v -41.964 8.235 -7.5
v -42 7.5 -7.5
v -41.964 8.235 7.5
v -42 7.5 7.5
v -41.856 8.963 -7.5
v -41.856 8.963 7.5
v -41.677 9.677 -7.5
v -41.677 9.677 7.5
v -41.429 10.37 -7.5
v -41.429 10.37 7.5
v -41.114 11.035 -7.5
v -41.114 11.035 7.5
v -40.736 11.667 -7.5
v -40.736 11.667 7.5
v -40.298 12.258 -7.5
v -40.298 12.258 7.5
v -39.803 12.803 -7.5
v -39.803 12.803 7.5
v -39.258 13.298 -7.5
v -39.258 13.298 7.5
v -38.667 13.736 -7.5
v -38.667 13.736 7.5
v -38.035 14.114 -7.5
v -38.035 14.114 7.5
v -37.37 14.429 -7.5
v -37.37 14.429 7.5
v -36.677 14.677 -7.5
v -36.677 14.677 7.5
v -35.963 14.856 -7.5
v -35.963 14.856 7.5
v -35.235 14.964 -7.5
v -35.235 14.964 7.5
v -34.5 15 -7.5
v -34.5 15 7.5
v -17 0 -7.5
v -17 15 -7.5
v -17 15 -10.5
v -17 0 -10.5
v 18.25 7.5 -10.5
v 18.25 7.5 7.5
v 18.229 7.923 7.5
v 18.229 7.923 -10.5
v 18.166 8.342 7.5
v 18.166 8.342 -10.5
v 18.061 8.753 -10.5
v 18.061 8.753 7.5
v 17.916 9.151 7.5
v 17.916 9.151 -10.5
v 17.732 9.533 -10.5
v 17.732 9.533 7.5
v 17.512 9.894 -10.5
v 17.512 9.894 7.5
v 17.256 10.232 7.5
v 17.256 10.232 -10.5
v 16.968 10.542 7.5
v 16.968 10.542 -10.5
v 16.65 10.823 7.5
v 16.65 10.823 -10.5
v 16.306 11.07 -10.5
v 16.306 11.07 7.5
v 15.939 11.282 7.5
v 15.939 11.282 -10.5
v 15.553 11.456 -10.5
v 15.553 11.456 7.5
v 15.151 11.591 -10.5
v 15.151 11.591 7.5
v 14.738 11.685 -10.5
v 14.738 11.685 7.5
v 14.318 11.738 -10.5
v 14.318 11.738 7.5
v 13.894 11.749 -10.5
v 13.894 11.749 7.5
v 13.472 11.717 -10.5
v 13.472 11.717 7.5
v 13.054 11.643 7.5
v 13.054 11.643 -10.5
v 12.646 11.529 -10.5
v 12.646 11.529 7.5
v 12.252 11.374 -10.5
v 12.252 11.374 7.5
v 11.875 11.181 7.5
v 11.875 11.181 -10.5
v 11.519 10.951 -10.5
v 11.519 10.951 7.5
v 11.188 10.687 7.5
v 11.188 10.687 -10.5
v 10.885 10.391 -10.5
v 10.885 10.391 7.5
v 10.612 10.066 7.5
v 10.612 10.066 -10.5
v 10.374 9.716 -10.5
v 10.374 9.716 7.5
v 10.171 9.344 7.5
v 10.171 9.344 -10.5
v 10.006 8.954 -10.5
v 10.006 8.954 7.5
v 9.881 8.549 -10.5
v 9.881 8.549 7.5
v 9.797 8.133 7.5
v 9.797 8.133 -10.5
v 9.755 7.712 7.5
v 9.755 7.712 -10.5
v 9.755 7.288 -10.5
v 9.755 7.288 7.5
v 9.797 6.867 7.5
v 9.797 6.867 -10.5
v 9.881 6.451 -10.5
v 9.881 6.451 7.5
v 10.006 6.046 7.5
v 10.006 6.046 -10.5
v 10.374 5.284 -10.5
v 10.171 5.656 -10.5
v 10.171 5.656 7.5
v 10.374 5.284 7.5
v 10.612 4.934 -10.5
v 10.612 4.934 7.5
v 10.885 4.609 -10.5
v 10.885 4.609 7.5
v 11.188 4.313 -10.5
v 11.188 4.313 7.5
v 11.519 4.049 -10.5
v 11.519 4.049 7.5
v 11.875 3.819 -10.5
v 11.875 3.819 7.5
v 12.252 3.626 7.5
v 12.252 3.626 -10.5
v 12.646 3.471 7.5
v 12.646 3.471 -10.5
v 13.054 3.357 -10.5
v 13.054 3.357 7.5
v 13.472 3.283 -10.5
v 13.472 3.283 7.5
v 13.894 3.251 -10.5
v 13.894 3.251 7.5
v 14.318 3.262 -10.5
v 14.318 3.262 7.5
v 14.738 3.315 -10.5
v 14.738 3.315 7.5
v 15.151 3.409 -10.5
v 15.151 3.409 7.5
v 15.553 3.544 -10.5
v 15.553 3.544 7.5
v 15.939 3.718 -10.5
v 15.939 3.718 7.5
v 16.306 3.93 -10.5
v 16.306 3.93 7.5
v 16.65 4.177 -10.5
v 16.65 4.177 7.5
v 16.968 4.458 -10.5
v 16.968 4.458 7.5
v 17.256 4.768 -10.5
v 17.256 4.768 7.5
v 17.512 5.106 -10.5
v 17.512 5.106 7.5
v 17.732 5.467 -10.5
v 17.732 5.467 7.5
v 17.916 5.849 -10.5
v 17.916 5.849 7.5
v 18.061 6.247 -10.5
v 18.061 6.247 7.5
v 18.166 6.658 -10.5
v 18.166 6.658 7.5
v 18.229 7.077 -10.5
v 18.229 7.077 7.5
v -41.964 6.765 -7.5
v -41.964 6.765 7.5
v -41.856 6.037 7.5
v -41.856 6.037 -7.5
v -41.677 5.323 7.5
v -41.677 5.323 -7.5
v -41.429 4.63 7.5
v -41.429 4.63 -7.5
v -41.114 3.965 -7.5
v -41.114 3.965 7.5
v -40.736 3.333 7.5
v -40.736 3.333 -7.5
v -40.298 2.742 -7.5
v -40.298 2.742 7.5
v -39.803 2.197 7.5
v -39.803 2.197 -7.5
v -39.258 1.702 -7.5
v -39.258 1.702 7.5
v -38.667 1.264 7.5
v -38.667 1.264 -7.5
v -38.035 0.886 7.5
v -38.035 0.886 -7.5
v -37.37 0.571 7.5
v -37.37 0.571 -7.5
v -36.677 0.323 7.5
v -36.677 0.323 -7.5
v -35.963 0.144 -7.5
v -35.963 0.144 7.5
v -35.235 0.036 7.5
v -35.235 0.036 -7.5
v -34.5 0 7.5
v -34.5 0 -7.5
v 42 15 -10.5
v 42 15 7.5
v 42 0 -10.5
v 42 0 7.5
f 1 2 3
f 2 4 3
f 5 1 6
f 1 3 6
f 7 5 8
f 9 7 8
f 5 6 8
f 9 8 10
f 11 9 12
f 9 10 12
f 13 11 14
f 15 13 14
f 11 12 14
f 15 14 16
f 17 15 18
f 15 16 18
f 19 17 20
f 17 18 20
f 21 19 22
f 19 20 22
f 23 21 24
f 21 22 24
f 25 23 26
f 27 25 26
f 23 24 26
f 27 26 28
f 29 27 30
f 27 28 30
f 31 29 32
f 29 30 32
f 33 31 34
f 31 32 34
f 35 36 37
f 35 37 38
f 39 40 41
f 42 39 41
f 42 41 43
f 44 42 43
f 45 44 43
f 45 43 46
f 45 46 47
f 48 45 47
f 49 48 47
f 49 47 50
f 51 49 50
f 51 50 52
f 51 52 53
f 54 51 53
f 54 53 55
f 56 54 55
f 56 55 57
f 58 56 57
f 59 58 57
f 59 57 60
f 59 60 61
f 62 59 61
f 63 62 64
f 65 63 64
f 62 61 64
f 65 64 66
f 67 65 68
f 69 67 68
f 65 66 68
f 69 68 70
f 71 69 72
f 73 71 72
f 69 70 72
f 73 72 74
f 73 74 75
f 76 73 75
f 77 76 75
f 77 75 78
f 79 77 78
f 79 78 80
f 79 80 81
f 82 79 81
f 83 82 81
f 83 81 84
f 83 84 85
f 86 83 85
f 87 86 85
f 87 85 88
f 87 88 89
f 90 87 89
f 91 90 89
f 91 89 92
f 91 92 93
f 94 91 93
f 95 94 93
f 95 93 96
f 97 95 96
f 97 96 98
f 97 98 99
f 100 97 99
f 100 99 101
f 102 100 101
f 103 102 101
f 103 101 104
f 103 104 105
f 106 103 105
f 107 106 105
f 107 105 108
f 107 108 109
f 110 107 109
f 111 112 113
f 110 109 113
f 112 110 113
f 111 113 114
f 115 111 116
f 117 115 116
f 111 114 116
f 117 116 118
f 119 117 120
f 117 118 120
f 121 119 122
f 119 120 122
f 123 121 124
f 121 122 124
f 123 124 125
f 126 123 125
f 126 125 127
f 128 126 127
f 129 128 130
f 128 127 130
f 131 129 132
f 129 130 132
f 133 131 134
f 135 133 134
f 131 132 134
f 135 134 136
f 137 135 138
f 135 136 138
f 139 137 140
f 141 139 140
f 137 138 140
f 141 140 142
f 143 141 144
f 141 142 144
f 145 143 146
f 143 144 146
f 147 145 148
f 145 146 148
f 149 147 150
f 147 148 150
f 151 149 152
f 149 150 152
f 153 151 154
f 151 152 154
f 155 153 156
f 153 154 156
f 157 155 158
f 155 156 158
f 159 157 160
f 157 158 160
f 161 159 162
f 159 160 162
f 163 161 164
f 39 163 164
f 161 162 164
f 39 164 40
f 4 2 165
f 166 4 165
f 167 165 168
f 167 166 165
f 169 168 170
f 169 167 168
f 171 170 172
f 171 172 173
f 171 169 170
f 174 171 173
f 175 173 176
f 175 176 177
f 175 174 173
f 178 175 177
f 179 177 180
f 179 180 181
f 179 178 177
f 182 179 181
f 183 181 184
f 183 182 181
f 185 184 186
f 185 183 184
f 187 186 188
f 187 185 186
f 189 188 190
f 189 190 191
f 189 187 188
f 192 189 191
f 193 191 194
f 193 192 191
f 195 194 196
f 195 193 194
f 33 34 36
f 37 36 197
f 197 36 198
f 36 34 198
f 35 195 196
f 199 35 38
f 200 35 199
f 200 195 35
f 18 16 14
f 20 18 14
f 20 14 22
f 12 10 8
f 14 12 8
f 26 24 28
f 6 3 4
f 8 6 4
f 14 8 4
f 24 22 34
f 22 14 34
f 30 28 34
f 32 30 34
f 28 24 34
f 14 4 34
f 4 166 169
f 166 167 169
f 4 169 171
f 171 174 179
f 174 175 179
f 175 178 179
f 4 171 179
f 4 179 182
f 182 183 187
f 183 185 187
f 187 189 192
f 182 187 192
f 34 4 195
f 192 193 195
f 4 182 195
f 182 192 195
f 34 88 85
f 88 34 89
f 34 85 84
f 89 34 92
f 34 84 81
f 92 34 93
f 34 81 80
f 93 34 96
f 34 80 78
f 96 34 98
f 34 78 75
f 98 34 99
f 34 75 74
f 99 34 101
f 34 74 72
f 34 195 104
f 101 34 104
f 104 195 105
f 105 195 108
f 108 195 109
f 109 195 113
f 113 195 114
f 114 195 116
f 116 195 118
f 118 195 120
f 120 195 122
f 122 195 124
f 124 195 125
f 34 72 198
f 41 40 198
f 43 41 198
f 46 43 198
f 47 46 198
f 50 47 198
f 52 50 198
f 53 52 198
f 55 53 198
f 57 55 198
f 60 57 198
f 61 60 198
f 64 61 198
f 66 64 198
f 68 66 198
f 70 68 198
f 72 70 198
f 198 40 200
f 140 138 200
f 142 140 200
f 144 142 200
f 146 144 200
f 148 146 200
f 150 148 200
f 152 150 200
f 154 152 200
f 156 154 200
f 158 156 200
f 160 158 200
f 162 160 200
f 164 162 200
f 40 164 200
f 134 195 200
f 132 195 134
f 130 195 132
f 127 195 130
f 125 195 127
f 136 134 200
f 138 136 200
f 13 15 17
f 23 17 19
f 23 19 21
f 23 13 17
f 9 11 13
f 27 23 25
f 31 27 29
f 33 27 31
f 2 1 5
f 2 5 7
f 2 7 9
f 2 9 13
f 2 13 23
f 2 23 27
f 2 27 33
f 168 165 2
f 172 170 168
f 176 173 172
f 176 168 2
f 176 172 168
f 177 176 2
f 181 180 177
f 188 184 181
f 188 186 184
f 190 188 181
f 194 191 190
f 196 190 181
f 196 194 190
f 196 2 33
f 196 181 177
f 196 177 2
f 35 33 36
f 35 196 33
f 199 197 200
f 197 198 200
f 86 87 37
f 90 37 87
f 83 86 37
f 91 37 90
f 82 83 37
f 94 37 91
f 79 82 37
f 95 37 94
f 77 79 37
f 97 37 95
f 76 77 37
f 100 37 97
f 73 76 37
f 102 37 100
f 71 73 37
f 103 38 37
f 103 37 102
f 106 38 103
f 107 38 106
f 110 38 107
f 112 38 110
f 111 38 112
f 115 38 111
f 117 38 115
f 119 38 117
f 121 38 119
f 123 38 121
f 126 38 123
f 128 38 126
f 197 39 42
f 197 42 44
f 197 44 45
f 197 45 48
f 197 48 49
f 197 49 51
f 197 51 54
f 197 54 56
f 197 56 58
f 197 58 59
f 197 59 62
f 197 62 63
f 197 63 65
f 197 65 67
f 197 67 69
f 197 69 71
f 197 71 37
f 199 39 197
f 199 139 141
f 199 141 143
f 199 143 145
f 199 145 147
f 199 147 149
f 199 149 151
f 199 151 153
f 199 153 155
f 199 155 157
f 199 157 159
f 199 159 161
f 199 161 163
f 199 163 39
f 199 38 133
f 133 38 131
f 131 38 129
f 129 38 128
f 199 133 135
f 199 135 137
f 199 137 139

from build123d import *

# Parameters (mm, degrees)
F0_W     = 84
F0_H     = 15
F1_DEPTH = 15
F3_R     = 7.49999
F4_W     = 59
F4_H     = 15
F5_DEPTH = 3
F2_R     = 4.25
F6_DEPTH = 18.001


# Not quite as in the source:
# - a fillet or chamfer is up to 0.001 mm smaller than in the source, because OpenCascade refuses the exact size


with BuildPart() as f1:
    # F0 (on Front) → F1 (new body)
    with BuildSketch(Plane.XZ):
        Rectangle(F0_W, F0_H)
    extrude(amount=-F1_DEPTH)

    # F3 (radius 7.5 in the source; OpenCascade refuses exactly that, so slightly less here)
    f3_edges = [f1.edges().sort_by_distance(p)[0] for p in [
        (-42, 15, 0),
        (-42, 0, 0),
    ]]
    fillet(f3_edges, radius=F3_R)

    # F4 (on face) → F5 (join)
    with BuildSketch(Plane(origin=(0, 0, -7.5), x_dir=(1, 0, 0), z_dir=(0, 0, -1))):
        with Locations((12.5, -7.5)):
            Rectangle(F4_W, F4_H)
    extrude(amount=F5_DEPTH)

    # F2 (on face) → F6 (cut, through all)
    with BuildSketch(Plane.XY.offset(7.5)):
        with Locations((14, 7.5)):
            Circle(F2_R)
    extrude(amount=-F6_DEPTH, mode=Mode.SUBTRACT)


solid = f1.part
